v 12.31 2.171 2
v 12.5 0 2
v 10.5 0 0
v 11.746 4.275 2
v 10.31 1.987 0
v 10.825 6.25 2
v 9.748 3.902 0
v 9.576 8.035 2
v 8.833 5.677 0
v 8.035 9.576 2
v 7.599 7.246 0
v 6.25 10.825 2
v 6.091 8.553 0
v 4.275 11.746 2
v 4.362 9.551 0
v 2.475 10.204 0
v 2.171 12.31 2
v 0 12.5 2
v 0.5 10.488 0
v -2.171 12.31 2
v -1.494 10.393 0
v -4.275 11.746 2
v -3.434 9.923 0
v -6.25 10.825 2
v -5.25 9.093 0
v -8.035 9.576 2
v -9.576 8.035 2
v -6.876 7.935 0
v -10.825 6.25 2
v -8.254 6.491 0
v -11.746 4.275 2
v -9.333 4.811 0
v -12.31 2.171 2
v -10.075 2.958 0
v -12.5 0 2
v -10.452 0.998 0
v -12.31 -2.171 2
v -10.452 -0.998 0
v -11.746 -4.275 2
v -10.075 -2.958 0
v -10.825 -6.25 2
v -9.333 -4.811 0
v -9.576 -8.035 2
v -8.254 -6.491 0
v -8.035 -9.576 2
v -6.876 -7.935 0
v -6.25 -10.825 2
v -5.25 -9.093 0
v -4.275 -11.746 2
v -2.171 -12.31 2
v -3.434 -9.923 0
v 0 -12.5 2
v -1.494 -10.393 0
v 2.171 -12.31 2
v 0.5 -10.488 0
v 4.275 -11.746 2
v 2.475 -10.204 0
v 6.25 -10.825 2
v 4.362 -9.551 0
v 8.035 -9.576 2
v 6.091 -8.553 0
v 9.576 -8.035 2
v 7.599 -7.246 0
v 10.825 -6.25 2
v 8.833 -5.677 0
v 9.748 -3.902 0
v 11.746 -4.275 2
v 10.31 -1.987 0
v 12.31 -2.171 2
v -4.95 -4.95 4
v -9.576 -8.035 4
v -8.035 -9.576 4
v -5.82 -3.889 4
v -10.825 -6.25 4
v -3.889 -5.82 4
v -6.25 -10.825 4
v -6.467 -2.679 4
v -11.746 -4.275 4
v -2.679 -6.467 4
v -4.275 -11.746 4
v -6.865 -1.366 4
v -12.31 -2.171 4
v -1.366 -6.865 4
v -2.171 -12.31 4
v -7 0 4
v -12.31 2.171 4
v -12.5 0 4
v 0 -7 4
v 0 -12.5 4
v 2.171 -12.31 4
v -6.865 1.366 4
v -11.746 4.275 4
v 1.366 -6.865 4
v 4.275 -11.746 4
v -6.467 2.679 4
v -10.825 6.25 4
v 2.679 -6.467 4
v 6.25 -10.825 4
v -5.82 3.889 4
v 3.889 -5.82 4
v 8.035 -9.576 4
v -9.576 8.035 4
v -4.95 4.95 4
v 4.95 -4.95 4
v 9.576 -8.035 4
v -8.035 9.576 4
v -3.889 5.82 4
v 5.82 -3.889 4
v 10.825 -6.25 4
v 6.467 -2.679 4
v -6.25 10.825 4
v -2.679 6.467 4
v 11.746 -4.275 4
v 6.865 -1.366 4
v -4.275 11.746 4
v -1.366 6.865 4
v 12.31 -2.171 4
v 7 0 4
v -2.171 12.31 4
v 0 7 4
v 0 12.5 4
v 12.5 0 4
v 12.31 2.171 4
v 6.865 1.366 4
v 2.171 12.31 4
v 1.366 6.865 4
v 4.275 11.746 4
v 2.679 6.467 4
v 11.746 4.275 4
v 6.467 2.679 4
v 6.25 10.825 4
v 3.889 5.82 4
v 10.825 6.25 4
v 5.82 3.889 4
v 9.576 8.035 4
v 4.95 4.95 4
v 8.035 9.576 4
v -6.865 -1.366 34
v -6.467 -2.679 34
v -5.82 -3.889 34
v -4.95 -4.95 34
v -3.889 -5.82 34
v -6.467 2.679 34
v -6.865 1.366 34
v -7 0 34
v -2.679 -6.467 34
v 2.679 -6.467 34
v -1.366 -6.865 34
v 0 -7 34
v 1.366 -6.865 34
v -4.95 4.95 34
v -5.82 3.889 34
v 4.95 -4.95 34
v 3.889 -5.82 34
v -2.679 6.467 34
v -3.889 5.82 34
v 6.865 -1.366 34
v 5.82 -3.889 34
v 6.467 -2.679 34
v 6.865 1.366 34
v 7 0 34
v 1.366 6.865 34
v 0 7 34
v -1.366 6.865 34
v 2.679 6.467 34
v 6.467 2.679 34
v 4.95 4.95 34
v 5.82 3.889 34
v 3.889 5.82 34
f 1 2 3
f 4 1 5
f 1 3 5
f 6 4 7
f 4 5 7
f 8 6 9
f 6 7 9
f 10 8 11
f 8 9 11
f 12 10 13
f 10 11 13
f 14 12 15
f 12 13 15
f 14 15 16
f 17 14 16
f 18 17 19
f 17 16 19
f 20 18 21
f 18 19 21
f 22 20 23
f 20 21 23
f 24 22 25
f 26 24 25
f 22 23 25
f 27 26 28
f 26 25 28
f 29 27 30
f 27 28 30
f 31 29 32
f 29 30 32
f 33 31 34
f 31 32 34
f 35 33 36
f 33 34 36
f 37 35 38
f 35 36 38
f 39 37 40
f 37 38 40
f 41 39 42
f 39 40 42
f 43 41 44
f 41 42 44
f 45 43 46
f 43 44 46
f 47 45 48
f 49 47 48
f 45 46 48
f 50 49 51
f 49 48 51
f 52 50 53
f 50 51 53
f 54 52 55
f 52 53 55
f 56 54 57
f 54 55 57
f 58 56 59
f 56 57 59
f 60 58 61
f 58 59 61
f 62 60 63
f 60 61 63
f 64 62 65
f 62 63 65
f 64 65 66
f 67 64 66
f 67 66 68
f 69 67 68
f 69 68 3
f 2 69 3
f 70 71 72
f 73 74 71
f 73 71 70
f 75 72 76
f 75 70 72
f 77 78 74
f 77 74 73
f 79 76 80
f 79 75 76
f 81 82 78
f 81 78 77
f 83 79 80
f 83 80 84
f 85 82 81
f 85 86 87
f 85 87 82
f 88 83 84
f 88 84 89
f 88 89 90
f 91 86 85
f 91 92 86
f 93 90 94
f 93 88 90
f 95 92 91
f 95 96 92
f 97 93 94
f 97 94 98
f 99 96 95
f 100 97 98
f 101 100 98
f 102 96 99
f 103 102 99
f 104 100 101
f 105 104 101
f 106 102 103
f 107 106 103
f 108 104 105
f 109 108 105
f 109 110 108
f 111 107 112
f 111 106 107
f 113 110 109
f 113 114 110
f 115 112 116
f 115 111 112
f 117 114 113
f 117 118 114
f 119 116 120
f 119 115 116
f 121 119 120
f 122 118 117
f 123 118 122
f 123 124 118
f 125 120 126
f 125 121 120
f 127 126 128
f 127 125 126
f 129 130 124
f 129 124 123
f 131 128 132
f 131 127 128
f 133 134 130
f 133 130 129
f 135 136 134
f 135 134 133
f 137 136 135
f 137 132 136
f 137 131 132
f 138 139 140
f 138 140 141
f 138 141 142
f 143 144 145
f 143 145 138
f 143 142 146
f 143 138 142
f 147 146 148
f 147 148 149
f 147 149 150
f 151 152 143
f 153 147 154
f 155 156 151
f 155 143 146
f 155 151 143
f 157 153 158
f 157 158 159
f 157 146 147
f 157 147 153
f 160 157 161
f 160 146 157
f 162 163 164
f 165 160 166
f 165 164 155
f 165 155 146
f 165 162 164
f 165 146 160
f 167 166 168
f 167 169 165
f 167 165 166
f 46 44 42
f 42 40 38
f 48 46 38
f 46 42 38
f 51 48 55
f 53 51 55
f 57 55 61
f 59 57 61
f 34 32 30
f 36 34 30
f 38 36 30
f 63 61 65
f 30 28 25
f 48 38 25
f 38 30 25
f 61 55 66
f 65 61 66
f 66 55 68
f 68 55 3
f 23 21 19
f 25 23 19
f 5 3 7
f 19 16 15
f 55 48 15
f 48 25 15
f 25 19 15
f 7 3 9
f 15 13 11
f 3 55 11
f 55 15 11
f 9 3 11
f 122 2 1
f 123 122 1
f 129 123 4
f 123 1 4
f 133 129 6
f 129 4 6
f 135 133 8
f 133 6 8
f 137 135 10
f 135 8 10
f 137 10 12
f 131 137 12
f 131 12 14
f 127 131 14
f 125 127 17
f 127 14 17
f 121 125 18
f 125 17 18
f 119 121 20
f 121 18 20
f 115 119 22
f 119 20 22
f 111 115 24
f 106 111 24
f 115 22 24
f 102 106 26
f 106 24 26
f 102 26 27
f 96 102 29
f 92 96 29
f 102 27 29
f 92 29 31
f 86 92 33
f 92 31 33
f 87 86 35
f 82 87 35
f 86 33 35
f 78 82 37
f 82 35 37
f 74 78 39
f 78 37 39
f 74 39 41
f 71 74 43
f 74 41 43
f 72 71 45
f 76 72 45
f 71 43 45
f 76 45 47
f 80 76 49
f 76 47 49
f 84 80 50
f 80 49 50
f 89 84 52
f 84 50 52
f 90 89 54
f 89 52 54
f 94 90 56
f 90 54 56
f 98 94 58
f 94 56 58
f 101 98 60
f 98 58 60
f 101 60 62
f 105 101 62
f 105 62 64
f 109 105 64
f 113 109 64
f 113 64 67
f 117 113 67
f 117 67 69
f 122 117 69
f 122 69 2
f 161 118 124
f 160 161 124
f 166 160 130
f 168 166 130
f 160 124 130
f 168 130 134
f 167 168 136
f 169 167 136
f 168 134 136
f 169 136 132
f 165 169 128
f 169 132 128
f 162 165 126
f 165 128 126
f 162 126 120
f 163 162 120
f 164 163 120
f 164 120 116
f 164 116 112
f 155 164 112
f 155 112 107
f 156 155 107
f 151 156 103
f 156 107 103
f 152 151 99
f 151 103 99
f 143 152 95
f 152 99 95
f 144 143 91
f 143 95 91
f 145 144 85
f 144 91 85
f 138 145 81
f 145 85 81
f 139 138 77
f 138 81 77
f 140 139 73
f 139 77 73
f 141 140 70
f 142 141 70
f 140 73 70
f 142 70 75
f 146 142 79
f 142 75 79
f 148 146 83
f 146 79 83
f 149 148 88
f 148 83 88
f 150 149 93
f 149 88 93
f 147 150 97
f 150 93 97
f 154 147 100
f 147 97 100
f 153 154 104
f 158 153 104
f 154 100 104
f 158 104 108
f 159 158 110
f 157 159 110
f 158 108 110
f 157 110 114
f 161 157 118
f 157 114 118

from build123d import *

# Parameters (mm, degrees)
SKETCH1_R           = 12.5
BOSS_EXTRUDE1_DEPTH = 4
SKETCH2_R           = 7
BOSS_EXTRUDE2_DEPTH = 30
CHAMFER1_SIZE       = 2


with BuildPart() as part:
    # Sketch1 → Boss-Extrude1 (new body)
    with BuildSketch(Plane.XY):
        Circle(SKETCH1_R)
    extrude(amount=BOSS_EXTRUDE1_DEPTH)

    # Sketch2 → Boss-Extrude2 (add)
    with BuildSketch(Plane.XY.offset(4)):
        Circle(SKETCH2_R)
    extrude(amount=BOSS_EXTRUDE2_DEPTH)

    # Chamfer1
    chamfer1_edges = [part.edges().sort_by_distance(p)[0] for p in [
        (-12.5, 0, 0),
    ]]
    chamfer(chamfer1_edges, length=CHAMFER1_SIZE)


solid = part.part
